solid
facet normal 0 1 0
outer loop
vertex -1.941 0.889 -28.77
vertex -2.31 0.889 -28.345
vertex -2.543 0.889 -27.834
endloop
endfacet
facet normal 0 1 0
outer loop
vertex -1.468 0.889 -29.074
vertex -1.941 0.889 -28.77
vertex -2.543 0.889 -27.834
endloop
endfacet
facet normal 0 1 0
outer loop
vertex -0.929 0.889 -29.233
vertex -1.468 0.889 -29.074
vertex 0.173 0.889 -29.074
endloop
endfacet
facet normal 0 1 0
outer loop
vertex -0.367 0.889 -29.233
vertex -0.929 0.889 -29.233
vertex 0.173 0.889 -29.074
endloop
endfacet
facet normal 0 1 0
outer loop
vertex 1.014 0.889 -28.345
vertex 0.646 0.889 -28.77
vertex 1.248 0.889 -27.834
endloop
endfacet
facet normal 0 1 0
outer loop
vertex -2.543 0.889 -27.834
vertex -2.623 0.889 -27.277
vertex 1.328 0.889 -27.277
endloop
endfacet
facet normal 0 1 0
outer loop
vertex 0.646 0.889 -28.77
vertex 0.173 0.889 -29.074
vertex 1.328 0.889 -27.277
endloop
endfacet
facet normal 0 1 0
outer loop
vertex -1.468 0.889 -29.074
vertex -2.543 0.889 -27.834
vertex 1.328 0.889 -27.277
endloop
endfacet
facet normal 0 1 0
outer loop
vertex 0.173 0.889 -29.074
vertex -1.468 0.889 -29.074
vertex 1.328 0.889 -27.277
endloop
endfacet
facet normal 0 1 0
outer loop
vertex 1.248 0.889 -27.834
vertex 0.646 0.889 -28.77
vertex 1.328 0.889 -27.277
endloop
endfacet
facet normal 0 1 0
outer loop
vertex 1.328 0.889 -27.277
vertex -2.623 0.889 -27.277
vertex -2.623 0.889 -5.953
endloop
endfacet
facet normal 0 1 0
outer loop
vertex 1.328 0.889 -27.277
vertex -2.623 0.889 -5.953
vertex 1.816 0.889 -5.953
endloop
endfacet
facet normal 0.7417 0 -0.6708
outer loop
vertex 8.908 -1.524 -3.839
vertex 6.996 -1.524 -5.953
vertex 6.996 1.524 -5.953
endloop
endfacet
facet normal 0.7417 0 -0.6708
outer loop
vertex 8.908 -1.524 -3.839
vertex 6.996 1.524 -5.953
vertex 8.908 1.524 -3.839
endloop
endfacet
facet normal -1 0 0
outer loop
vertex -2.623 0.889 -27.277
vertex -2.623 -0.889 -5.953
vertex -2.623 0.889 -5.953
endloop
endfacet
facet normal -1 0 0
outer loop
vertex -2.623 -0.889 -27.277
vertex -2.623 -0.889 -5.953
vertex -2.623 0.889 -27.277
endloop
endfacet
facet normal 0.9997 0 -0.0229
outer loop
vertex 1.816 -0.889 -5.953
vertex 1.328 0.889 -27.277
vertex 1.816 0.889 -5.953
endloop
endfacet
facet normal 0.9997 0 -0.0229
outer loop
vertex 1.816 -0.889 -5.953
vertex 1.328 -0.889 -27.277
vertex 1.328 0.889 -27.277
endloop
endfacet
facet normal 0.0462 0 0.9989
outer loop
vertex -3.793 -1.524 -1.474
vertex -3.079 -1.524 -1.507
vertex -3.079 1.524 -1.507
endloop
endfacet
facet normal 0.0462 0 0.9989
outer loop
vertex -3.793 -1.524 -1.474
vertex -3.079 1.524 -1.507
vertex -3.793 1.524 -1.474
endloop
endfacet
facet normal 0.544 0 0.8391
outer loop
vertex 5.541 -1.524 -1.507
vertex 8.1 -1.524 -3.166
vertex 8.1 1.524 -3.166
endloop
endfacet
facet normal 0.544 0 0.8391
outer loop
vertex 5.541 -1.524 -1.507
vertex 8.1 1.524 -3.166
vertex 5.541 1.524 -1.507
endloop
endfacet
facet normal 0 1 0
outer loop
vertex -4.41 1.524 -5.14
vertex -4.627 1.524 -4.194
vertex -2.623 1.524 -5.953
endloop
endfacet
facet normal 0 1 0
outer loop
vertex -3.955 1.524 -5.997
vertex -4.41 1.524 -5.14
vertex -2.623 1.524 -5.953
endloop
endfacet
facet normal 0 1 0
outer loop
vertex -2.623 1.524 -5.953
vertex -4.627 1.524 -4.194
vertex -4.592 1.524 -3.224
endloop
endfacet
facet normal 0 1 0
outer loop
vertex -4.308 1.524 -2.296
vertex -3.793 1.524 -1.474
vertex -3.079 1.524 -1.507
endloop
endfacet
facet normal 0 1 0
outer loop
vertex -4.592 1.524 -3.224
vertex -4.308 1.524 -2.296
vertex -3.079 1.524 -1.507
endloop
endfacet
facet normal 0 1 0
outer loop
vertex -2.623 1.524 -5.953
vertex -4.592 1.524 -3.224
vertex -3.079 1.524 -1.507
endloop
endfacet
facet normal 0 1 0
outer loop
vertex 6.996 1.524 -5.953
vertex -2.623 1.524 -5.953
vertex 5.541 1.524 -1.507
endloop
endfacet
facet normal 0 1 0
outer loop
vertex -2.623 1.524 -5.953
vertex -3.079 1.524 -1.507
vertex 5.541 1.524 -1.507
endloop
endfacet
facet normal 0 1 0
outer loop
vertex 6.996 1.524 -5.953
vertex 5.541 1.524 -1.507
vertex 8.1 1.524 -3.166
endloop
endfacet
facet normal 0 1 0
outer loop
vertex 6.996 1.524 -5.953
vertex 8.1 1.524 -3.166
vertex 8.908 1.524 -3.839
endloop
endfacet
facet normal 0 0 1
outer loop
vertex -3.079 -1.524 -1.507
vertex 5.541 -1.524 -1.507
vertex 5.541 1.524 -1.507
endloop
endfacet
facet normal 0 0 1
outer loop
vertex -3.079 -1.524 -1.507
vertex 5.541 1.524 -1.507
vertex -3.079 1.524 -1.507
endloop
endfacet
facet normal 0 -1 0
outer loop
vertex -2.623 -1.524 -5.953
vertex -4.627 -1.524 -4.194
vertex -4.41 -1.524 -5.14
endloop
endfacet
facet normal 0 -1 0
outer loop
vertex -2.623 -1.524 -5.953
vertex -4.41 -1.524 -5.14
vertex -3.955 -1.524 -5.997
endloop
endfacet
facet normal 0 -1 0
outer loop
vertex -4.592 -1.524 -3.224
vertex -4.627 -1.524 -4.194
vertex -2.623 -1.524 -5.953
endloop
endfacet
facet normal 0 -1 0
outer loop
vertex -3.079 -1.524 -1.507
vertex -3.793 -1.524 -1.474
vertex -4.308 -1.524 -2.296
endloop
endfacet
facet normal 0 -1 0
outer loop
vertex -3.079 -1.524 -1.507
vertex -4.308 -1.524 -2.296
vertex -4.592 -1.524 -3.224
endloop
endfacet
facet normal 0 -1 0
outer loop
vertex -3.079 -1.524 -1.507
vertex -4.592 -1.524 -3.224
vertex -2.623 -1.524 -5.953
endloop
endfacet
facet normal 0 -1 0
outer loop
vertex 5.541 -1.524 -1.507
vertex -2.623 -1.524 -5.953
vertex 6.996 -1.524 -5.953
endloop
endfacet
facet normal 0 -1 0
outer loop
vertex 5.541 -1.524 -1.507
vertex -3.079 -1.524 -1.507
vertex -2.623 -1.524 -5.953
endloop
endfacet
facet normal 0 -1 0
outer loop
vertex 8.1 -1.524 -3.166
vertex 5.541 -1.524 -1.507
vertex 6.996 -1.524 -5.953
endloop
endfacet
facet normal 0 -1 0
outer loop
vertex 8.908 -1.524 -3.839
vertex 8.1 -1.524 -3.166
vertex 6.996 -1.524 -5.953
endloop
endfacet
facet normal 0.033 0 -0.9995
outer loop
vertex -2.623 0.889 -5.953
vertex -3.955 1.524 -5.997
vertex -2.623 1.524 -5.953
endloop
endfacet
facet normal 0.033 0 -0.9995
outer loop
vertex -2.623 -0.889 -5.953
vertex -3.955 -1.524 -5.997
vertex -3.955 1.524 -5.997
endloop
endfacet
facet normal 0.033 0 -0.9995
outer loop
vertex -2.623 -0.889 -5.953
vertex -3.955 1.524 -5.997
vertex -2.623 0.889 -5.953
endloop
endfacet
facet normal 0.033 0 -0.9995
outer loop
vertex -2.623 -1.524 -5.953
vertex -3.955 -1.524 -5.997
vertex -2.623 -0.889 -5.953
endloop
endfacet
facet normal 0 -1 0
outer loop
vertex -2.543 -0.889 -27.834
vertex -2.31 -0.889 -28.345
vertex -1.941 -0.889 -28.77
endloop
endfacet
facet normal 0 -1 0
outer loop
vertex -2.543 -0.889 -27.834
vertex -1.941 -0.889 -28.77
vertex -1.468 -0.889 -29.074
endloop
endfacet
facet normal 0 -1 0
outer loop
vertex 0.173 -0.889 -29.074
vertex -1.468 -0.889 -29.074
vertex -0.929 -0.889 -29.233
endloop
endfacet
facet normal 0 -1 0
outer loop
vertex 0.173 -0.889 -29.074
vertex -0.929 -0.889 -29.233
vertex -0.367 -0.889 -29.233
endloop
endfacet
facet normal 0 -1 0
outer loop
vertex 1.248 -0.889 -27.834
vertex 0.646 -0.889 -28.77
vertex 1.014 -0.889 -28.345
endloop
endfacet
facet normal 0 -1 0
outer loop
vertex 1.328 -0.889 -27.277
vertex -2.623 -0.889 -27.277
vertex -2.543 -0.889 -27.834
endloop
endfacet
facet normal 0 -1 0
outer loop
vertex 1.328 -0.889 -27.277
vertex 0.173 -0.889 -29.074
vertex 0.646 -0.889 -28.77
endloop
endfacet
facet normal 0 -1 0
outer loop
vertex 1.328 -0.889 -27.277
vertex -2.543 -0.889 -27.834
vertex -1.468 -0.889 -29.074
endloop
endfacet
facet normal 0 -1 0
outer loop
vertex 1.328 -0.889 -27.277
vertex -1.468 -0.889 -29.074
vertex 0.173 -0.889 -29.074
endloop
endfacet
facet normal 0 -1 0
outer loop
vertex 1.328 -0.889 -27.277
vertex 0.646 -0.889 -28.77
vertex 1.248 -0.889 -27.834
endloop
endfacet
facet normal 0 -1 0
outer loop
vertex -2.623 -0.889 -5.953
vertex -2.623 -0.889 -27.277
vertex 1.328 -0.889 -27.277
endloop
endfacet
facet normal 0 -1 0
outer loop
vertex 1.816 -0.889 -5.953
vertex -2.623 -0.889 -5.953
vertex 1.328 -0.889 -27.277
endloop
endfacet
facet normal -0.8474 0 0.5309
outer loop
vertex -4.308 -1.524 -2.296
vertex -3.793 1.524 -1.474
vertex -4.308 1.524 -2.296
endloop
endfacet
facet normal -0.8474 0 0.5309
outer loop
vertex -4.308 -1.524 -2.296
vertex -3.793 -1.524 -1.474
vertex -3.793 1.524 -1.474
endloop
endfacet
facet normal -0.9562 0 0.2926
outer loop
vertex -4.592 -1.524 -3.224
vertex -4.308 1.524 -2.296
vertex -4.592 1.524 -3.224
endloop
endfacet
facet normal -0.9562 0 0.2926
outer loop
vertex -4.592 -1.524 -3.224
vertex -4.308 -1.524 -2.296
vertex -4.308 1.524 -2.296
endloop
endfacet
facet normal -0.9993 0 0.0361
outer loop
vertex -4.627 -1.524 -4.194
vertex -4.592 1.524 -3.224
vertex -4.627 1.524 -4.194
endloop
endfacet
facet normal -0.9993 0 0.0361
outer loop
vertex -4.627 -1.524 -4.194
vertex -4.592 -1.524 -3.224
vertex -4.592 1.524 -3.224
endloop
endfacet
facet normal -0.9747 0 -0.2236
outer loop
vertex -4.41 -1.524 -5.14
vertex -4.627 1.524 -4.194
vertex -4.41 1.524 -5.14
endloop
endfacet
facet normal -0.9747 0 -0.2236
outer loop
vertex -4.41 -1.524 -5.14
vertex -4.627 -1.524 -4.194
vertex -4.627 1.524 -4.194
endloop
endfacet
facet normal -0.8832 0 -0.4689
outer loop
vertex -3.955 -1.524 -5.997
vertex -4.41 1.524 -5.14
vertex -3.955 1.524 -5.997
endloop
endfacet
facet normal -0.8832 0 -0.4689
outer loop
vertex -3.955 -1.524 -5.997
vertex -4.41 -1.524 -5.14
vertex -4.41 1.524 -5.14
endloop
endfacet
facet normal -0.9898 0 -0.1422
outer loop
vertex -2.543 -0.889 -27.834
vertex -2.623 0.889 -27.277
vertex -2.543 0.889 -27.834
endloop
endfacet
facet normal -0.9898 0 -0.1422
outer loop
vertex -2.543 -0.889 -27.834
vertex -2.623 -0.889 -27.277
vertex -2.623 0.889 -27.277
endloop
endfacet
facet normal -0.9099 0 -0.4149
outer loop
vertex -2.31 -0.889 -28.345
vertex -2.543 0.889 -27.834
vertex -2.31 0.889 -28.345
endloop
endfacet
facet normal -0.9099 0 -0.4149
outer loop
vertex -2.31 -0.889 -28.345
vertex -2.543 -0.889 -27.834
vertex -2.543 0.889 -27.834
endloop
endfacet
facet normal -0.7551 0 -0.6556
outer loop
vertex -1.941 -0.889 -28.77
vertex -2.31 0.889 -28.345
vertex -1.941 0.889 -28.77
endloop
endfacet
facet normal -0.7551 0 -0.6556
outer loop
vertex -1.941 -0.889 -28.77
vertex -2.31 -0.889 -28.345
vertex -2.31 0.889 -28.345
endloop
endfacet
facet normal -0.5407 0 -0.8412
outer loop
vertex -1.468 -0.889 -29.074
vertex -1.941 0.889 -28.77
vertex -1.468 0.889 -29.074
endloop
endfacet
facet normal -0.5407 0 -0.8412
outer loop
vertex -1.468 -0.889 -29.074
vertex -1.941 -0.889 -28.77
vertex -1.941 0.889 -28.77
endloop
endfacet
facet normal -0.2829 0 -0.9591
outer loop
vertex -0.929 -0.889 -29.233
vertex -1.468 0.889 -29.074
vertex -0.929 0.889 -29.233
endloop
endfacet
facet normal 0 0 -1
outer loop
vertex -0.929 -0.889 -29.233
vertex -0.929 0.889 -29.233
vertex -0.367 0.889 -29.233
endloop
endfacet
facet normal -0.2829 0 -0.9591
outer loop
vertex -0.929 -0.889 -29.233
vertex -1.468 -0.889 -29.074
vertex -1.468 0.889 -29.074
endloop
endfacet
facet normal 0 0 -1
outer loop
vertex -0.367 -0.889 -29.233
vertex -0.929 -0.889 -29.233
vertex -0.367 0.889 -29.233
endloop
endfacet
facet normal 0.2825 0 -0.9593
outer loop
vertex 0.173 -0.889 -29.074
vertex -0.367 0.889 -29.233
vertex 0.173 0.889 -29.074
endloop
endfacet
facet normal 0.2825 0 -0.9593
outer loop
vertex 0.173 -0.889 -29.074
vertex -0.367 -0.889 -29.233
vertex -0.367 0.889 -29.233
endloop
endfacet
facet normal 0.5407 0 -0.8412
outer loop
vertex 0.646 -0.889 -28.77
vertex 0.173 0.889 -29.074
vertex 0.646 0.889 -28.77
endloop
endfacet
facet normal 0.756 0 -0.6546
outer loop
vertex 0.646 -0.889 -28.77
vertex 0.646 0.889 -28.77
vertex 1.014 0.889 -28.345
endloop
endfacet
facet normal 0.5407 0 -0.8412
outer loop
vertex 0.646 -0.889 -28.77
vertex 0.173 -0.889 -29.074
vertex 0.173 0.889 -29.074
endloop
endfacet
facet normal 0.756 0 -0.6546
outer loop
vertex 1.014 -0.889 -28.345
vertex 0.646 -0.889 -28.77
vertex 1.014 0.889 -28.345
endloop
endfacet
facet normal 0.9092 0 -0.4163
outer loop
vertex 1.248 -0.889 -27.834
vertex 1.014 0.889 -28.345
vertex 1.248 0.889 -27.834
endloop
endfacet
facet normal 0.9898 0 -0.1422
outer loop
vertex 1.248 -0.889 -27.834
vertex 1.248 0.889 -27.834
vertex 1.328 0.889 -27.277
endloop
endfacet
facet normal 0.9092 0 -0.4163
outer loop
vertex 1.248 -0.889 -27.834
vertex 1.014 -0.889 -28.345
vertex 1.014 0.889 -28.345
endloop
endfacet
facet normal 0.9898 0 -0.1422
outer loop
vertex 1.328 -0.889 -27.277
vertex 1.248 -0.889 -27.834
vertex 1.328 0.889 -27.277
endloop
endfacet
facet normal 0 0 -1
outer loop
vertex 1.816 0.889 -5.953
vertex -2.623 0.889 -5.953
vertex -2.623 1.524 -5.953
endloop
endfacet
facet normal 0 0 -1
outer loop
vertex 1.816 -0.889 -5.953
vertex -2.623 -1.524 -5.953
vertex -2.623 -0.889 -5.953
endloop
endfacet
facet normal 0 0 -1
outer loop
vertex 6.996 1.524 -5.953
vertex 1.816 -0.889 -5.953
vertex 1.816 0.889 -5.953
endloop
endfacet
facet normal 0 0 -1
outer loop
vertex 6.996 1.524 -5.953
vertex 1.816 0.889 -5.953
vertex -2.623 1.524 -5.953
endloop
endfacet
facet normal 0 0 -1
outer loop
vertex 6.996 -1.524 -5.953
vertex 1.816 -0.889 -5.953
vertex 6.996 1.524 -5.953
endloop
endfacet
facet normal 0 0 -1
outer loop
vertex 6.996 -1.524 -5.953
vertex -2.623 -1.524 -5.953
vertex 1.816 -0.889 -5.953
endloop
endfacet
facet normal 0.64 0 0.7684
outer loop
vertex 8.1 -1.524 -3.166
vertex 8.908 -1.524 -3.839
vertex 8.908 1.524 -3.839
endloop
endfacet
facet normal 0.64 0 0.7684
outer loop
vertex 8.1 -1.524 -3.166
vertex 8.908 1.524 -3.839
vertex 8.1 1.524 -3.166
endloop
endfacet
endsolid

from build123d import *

# Parameters (mm, degrees)
F1_DEPTH = 0.889
F2_DEPTH = 1.524


with BuildPart() as f1:
    # F0 (on Front) → F1 (new body, symmetric)
    with BuildSketch(Plane.XZ):
        with BuildLine():
            Line((1.327608, -27.277179), (1.816115, -5.952824))
            Line((1.816115, -5.952824), (-2.623277, -5.952824))
            Line((-2.623277, -5.952824), (-2.623277, -27.277179))
            ThreePointArc((-2.623277, -27.277179), (-0.647834, -29.252622), (1.327608, -27.277179))
        make_face()
    extrude(amount=F1_DEPTH, both=True)

    # F0 (on Front) → F2 (join, symmetric)
    with BuildSketch(Plane.XZ):
        with BuildLine():
            Line((-2.623277, -5.952824), (1.816115, -5.952824))
            Line((1.816115, -5.952824), (4.033533, -5.952824))
            Line((4.033533, -5.952824), (6.996475, -5.952824))
            Line((6.996475, -5.952824), (8.907864, -3.839395))
            Line((8.907864, -3.839395), (8.099831, -3.165916))
            Line((8.099831, -3.165916), (5.540981, -1.507046))
            Line((5.540981, -1.507046), (2.552063, -1.507046))
            Line((2.552063, -1.507046), (-0.735558, -1.507046))
            Line((-0.735558, -1.507046), (-2.122533, -1.507046))
            Line((-2.122533, -1.507046), (-3.079158, -1.507046))
            Line((-3.079158, -1.507046), (-3.793383, -1.473681))
            ThreePointArc((-3.793383, -1.473681), (-4.641575, -3.707847), (-3.955338, -5.996954))
            Line((-3.955338, -5.996954), (-2.623277, -5.952824))
        make_face()
    extrude(amount=F2_DEPTH, both=True)


solid = f1.part
